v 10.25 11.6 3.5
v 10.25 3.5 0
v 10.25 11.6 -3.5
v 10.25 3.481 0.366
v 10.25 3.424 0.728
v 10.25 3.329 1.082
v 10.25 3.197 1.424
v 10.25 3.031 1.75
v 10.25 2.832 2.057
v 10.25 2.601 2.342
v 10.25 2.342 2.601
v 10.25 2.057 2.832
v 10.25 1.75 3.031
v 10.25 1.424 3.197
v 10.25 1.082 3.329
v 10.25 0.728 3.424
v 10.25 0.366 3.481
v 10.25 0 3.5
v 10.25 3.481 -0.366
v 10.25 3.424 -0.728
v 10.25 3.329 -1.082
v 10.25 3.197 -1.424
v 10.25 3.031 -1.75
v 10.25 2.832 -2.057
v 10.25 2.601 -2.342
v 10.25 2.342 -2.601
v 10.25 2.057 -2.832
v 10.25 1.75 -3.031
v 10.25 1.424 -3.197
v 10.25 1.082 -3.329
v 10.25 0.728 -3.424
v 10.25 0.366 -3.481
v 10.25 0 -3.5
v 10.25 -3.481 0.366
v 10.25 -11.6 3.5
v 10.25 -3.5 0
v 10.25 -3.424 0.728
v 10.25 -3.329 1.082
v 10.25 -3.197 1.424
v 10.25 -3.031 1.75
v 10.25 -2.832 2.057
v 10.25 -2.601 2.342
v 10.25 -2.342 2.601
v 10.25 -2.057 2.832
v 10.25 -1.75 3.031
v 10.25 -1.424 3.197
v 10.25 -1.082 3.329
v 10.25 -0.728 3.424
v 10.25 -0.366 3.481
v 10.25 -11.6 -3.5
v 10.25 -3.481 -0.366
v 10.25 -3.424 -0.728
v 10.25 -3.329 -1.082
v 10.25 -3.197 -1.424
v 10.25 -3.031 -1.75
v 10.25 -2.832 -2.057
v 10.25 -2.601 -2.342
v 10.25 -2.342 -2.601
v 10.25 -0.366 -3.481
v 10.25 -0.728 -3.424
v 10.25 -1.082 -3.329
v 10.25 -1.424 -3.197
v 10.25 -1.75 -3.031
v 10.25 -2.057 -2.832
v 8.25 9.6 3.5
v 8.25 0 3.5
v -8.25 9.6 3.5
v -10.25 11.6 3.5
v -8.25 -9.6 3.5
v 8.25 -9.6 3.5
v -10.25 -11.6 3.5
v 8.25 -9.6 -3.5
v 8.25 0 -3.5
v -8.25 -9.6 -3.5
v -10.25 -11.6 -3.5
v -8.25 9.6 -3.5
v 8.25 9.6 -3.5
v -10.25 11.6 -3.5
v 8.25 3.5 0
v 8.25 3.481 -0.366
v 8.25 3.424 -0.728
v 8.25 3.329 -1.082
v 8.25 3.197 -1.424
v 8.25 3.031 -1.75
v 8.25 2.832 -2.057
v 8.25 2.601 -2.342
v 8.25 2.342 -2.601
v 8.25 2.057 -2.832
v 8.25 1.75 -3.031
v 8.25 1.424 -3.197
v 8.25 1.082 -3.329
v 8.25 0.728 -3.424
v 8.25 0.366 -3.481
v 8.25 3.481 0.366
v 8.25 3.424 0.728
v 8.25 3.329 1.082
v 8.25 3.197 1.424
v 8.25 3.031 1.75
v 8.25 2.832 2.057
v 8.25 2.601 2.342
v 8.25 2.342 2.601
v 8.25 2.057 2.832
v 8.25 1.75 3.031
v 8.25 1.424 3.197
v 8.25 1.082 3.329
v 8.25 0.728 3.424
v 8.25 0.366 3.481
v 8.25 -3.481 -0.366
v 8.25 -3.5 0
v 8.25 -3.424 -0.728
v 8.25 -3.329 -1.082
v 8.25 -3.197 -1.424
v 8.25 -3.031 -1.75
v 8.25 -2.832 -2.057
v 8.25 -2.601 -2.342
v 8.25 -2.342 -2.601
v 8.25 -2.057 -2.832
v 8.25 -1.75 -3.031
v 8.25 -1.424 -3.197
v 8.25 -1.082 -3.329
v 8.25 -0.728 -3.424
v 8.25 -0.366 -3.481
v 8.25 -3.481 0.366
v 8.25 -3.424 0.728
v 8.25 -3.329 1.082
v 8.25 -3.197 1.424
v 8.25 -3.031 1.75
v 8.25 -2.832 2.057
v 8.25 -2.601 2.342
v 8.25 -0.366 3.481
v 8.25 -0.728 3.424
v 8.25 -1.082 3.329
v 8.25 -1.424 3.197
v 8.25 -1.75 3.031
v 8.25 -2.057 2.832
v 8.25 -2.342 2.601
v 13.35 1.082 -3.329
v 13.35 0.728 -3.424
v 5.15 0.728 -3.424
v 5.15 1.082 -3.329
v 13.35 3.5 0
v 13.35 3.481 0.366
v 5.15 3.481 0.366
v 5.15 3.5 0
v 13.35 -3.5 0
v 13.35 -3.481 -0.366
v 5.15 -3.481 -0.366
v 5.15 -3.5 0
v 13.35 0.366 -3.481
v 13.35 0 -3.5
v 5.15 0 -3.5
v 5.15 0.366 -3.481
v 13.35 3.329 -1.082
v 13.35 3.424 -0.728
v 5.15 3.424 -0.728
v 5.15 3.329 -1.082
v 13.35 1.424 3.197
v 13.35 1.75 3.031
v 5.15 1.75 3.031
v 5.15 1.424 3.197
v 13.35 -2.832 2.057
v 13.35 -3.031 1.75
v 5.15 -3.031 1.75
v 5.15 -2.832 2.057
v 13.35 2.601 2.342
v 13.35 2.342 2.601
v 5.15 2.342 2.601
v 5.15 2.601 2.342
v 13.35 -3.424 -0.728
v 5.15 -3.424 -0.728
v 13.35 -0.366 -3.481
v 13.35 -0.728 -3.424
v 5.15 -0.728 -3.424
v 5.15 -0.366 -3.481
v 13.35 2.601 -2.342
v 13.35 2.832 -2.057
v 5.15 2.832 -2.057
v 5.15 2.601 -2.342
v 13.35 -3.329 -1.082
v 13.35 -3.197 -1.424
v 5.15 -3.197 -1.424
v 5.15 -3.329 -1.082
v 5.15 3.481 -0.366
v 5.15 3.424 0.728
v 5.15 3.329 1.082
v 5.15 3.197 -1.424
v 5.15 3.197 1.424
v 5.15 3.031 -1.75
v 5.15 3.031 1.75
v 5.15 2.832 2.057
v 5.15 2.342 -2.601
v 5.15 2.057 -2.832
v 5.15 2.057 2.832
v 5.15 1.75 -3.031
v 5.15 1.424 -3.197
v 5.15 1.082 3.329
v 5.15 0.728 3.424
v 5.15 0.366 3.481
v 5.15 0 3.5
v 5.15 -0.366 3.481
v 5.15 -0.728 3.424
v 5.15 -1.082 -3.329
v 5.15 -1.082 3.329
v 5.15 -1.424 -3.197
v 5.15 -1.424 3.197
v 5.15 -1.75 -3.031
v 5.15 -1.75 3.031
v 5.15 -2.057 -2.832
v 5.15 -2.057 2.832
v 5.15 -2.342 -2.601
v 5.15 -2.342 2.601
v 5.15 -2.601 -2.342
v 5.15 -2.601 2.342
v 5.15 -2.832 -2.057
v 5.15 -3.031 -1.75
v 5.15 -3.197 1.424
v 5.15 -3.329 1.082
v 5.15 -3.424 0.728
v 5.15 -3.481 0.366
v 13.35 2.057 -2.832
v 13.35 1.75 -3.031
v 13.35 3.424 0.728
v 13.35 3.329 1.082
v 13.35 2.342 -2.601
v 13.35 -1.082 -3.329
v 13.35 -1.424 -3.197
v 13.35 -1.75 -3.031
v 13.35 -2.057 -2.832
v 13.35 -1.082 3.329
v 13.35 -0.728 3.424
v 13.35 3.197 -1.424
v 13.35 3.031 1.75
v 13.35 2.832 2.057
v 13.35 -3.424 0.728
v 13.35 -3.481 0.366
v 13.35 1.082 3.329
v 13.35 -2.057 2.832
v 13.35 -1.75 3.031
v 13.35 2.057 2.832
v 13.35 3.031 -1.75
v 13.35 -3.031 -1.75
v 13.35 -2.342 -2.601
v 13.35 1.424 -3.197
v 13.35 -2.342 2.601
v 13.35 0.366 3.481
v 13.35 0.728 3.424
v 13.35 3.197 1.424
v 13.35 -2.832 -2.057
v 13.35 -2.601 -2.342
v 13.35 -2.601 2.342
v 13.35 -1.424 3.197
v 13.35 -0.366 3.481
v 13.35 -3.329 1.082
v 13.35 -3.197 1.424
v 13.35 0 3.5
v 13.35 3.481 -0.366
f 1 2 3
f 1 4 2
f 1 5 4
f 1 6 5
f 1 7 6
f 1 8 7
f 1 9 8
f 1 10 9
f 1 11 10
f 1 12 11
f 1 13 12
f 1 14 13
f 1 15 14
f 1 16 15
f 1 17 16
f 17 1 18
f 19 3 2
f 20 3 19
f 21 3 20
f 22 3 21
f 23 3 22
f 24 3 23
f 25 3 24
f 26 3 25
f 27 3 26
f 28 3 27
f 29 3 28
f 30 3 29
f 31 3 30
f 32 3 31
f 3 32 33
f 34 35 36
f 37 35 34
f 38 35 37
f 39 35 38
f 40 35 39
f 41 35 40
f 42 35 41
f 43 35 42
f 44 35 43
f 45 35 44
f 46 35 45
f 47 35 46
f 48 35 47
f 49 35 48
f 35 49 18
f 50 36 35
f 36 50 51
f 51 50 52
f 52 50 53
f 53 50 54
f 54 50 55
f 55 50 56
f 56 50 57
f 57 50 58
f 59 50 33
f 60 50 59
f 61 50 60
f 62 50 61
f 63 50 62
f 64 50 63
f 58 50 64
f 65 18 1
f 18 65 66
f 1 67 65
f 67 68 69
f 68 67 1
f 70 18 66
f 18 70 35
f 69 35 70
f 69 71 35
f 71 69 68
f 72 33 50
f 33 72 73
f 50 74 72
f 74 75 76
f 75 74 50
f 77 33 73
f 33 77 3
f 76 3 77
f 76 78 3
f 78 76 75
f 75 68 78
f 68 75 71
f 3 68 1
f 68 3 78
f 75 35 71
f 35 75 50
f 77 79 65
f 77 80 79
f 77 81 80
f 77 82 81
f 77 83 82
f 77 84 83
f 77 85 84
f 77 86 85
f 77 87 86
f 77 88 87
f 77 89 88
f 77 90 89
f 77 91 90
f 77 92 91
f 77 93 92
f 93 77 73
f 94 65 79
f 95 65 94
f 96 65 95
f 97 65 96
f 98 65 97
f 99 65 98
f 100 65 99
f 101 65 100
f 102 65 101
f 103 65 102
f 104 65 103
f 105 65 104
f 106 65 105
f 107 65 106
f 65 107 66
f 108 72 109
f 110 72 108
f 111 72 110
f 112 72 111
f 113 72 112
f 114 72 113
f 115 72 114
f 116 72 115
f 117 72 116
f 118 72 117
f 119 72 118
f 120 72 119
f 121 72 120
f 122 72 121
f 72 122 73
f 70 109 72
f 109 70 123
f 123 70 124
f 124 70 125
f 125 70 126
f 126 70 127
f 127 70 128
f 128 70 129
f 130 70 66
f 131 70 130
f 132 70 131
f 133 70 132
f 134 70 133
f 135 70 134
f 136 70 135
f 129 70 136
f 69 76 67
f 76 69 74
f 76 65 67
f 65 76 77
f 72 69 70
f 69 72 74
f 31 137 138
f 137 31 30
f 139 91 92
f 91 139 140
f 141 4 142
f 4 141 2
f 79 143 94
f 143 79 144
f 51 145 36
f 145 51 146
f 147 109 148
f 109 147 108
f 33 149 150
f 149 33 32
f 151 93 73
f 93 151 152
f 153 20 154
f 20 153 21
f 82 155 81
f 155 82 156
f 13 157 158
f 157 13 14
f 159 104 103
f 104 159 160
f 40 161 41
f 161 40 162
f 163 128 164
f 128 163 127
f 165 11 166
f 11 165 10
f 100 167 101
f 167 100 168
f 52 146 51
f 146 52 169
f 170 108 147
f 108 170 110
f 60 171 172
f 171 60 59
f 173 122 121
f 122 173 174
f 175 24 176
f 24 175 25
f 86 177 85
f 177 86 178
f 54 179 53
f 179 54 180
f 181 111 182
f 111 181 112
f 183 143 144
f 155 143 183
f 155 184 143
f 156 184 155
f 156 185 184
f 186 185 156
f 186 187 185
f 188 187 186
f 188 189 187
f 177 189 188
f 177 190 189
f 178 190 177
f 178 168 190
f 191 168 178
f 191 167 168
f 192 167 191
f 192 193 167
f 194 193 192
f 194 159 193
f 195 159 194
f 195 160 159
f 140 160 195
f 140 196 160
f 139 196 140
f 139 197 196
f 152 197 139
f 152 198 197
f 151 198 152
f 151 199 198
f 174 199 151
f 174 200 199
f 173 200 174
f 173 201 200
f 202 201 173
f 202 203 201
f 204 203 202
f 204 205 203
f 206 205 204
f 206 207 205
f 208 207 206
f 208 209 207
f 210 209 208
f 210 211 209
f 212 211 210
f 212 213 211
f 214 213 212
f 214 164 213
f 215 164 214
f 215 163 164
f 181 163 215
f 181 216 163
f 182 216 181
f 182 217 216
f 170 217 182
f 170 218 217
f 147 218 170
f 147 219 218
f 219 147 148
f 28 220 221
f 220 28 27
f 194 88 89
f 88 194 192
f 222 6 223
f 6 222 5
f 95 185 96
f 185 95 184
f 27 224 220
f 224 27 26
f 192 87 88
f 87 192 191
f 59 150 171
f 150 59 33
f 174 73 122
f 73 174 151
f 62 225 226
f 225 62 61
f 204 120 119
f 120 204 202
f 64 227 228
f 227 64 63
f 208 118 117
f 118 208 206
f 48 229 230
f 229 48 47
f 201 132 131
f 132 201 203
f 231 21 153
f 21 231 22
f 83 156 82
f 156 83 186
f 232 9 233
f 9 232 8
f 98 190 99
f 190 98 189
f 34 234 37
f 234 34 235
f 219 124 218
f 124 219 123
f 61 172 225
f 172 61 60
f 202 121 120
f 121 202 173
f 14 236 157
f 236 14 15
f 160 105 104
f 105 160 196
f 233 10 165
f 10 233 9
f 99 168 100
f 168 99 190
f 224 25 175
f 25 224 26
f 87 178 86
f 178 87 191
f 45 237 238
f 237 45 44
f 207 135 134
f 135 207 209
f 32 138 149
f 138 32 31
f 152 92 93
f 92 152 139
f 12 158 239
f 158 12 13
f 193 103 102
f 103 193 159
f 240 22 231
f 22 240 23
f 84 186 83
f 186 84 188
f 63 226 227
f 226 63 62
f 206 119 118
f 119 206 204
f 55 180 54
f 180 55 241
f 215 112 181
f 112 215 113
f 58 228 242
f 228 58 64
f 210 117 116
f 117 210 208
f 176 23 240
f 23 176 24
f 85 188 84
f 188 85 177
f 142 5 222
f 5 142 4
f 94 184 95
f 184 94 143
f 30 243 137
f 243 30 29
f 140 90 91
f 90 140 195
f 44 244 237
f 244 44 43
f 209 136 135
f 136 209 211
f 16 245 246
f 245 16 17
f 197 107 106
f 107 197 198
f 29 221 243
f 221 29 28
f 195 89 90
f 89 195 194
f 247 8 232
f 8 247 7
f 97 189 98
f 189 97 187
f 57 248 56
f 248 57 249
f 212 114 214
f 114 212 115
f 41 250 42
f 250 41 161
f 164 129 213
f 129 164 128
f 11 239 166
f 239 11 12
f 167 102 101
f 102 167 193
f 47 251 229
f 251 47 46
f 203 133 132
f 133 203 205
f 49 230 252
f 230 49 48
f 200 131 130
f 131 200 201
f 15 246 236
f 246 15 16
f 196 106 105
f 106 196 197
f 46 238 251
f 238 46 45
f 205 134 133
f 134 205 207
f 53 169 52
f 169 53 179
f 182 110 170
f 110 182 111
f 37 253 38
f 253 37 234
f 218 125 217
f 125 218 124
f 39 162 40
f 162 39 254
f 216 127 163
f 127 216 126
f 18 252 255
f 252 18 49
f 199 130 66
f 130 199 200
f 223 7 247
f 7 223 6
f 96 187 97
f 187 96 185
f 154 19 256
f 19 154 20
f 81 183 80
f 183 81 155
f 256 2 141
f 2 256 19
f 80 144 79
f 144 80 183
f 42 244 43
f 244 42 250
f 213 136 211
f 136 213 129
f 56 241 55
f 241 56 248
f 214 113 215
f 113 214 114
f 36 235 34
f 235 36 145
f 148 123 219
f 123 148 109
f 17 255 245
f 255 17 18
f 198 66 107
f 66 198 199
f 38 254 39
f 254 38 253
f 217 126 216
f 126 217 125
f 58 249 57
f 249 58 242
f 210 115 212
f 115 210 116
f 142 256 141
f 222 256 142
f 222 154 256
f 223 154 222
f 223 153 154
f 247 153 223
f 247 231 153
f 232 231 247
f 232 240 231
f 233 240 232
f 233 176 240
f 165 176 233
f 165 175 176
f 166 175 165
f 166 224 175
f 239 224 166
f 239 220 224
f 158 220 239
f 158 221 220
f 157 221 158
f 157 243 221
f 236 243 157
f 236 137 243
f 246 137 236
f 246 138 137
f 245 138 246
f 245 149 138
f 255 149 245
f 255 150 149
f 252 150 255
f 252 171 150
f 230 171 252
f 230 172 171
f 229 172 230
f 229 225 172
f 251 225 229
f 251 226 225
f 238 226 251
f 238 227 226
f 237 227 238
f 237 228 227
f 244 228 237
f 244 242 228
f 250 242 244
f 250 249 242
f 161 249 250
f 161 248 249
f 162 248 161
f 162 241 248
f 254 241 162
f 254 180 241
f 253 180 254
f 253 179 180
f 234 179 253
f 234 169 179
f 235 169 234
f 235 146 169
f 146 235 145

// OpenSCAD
light_thickness = 16.5; //mm
light_height = 19.2; //mm
strap_thickness = 2; //mm
strap_width = 7; //mm
button_depth= 3.1; //mm

$fn=60;

difference() {
  cube([light_thickness + 2 * strap_thickness, light_height + 2 * strap_thickness, strap_width], center=true);

  cube([light_thickness, light_height, strap_width + 0.1], center=true);
}

translate([light_thickness/2, 0, 0]) {
  rotate([0,90,0]) {
    cylinder(d=strap_width, h=button_depth * 2, center=true);
  }
}

translate([light_thickness/2 + strap_thickness, 0, 0]) {
  rotate([0,90,0]) {
    cylinder(d=strap_width, h=button_depth * 2, center=true);
  }
}
